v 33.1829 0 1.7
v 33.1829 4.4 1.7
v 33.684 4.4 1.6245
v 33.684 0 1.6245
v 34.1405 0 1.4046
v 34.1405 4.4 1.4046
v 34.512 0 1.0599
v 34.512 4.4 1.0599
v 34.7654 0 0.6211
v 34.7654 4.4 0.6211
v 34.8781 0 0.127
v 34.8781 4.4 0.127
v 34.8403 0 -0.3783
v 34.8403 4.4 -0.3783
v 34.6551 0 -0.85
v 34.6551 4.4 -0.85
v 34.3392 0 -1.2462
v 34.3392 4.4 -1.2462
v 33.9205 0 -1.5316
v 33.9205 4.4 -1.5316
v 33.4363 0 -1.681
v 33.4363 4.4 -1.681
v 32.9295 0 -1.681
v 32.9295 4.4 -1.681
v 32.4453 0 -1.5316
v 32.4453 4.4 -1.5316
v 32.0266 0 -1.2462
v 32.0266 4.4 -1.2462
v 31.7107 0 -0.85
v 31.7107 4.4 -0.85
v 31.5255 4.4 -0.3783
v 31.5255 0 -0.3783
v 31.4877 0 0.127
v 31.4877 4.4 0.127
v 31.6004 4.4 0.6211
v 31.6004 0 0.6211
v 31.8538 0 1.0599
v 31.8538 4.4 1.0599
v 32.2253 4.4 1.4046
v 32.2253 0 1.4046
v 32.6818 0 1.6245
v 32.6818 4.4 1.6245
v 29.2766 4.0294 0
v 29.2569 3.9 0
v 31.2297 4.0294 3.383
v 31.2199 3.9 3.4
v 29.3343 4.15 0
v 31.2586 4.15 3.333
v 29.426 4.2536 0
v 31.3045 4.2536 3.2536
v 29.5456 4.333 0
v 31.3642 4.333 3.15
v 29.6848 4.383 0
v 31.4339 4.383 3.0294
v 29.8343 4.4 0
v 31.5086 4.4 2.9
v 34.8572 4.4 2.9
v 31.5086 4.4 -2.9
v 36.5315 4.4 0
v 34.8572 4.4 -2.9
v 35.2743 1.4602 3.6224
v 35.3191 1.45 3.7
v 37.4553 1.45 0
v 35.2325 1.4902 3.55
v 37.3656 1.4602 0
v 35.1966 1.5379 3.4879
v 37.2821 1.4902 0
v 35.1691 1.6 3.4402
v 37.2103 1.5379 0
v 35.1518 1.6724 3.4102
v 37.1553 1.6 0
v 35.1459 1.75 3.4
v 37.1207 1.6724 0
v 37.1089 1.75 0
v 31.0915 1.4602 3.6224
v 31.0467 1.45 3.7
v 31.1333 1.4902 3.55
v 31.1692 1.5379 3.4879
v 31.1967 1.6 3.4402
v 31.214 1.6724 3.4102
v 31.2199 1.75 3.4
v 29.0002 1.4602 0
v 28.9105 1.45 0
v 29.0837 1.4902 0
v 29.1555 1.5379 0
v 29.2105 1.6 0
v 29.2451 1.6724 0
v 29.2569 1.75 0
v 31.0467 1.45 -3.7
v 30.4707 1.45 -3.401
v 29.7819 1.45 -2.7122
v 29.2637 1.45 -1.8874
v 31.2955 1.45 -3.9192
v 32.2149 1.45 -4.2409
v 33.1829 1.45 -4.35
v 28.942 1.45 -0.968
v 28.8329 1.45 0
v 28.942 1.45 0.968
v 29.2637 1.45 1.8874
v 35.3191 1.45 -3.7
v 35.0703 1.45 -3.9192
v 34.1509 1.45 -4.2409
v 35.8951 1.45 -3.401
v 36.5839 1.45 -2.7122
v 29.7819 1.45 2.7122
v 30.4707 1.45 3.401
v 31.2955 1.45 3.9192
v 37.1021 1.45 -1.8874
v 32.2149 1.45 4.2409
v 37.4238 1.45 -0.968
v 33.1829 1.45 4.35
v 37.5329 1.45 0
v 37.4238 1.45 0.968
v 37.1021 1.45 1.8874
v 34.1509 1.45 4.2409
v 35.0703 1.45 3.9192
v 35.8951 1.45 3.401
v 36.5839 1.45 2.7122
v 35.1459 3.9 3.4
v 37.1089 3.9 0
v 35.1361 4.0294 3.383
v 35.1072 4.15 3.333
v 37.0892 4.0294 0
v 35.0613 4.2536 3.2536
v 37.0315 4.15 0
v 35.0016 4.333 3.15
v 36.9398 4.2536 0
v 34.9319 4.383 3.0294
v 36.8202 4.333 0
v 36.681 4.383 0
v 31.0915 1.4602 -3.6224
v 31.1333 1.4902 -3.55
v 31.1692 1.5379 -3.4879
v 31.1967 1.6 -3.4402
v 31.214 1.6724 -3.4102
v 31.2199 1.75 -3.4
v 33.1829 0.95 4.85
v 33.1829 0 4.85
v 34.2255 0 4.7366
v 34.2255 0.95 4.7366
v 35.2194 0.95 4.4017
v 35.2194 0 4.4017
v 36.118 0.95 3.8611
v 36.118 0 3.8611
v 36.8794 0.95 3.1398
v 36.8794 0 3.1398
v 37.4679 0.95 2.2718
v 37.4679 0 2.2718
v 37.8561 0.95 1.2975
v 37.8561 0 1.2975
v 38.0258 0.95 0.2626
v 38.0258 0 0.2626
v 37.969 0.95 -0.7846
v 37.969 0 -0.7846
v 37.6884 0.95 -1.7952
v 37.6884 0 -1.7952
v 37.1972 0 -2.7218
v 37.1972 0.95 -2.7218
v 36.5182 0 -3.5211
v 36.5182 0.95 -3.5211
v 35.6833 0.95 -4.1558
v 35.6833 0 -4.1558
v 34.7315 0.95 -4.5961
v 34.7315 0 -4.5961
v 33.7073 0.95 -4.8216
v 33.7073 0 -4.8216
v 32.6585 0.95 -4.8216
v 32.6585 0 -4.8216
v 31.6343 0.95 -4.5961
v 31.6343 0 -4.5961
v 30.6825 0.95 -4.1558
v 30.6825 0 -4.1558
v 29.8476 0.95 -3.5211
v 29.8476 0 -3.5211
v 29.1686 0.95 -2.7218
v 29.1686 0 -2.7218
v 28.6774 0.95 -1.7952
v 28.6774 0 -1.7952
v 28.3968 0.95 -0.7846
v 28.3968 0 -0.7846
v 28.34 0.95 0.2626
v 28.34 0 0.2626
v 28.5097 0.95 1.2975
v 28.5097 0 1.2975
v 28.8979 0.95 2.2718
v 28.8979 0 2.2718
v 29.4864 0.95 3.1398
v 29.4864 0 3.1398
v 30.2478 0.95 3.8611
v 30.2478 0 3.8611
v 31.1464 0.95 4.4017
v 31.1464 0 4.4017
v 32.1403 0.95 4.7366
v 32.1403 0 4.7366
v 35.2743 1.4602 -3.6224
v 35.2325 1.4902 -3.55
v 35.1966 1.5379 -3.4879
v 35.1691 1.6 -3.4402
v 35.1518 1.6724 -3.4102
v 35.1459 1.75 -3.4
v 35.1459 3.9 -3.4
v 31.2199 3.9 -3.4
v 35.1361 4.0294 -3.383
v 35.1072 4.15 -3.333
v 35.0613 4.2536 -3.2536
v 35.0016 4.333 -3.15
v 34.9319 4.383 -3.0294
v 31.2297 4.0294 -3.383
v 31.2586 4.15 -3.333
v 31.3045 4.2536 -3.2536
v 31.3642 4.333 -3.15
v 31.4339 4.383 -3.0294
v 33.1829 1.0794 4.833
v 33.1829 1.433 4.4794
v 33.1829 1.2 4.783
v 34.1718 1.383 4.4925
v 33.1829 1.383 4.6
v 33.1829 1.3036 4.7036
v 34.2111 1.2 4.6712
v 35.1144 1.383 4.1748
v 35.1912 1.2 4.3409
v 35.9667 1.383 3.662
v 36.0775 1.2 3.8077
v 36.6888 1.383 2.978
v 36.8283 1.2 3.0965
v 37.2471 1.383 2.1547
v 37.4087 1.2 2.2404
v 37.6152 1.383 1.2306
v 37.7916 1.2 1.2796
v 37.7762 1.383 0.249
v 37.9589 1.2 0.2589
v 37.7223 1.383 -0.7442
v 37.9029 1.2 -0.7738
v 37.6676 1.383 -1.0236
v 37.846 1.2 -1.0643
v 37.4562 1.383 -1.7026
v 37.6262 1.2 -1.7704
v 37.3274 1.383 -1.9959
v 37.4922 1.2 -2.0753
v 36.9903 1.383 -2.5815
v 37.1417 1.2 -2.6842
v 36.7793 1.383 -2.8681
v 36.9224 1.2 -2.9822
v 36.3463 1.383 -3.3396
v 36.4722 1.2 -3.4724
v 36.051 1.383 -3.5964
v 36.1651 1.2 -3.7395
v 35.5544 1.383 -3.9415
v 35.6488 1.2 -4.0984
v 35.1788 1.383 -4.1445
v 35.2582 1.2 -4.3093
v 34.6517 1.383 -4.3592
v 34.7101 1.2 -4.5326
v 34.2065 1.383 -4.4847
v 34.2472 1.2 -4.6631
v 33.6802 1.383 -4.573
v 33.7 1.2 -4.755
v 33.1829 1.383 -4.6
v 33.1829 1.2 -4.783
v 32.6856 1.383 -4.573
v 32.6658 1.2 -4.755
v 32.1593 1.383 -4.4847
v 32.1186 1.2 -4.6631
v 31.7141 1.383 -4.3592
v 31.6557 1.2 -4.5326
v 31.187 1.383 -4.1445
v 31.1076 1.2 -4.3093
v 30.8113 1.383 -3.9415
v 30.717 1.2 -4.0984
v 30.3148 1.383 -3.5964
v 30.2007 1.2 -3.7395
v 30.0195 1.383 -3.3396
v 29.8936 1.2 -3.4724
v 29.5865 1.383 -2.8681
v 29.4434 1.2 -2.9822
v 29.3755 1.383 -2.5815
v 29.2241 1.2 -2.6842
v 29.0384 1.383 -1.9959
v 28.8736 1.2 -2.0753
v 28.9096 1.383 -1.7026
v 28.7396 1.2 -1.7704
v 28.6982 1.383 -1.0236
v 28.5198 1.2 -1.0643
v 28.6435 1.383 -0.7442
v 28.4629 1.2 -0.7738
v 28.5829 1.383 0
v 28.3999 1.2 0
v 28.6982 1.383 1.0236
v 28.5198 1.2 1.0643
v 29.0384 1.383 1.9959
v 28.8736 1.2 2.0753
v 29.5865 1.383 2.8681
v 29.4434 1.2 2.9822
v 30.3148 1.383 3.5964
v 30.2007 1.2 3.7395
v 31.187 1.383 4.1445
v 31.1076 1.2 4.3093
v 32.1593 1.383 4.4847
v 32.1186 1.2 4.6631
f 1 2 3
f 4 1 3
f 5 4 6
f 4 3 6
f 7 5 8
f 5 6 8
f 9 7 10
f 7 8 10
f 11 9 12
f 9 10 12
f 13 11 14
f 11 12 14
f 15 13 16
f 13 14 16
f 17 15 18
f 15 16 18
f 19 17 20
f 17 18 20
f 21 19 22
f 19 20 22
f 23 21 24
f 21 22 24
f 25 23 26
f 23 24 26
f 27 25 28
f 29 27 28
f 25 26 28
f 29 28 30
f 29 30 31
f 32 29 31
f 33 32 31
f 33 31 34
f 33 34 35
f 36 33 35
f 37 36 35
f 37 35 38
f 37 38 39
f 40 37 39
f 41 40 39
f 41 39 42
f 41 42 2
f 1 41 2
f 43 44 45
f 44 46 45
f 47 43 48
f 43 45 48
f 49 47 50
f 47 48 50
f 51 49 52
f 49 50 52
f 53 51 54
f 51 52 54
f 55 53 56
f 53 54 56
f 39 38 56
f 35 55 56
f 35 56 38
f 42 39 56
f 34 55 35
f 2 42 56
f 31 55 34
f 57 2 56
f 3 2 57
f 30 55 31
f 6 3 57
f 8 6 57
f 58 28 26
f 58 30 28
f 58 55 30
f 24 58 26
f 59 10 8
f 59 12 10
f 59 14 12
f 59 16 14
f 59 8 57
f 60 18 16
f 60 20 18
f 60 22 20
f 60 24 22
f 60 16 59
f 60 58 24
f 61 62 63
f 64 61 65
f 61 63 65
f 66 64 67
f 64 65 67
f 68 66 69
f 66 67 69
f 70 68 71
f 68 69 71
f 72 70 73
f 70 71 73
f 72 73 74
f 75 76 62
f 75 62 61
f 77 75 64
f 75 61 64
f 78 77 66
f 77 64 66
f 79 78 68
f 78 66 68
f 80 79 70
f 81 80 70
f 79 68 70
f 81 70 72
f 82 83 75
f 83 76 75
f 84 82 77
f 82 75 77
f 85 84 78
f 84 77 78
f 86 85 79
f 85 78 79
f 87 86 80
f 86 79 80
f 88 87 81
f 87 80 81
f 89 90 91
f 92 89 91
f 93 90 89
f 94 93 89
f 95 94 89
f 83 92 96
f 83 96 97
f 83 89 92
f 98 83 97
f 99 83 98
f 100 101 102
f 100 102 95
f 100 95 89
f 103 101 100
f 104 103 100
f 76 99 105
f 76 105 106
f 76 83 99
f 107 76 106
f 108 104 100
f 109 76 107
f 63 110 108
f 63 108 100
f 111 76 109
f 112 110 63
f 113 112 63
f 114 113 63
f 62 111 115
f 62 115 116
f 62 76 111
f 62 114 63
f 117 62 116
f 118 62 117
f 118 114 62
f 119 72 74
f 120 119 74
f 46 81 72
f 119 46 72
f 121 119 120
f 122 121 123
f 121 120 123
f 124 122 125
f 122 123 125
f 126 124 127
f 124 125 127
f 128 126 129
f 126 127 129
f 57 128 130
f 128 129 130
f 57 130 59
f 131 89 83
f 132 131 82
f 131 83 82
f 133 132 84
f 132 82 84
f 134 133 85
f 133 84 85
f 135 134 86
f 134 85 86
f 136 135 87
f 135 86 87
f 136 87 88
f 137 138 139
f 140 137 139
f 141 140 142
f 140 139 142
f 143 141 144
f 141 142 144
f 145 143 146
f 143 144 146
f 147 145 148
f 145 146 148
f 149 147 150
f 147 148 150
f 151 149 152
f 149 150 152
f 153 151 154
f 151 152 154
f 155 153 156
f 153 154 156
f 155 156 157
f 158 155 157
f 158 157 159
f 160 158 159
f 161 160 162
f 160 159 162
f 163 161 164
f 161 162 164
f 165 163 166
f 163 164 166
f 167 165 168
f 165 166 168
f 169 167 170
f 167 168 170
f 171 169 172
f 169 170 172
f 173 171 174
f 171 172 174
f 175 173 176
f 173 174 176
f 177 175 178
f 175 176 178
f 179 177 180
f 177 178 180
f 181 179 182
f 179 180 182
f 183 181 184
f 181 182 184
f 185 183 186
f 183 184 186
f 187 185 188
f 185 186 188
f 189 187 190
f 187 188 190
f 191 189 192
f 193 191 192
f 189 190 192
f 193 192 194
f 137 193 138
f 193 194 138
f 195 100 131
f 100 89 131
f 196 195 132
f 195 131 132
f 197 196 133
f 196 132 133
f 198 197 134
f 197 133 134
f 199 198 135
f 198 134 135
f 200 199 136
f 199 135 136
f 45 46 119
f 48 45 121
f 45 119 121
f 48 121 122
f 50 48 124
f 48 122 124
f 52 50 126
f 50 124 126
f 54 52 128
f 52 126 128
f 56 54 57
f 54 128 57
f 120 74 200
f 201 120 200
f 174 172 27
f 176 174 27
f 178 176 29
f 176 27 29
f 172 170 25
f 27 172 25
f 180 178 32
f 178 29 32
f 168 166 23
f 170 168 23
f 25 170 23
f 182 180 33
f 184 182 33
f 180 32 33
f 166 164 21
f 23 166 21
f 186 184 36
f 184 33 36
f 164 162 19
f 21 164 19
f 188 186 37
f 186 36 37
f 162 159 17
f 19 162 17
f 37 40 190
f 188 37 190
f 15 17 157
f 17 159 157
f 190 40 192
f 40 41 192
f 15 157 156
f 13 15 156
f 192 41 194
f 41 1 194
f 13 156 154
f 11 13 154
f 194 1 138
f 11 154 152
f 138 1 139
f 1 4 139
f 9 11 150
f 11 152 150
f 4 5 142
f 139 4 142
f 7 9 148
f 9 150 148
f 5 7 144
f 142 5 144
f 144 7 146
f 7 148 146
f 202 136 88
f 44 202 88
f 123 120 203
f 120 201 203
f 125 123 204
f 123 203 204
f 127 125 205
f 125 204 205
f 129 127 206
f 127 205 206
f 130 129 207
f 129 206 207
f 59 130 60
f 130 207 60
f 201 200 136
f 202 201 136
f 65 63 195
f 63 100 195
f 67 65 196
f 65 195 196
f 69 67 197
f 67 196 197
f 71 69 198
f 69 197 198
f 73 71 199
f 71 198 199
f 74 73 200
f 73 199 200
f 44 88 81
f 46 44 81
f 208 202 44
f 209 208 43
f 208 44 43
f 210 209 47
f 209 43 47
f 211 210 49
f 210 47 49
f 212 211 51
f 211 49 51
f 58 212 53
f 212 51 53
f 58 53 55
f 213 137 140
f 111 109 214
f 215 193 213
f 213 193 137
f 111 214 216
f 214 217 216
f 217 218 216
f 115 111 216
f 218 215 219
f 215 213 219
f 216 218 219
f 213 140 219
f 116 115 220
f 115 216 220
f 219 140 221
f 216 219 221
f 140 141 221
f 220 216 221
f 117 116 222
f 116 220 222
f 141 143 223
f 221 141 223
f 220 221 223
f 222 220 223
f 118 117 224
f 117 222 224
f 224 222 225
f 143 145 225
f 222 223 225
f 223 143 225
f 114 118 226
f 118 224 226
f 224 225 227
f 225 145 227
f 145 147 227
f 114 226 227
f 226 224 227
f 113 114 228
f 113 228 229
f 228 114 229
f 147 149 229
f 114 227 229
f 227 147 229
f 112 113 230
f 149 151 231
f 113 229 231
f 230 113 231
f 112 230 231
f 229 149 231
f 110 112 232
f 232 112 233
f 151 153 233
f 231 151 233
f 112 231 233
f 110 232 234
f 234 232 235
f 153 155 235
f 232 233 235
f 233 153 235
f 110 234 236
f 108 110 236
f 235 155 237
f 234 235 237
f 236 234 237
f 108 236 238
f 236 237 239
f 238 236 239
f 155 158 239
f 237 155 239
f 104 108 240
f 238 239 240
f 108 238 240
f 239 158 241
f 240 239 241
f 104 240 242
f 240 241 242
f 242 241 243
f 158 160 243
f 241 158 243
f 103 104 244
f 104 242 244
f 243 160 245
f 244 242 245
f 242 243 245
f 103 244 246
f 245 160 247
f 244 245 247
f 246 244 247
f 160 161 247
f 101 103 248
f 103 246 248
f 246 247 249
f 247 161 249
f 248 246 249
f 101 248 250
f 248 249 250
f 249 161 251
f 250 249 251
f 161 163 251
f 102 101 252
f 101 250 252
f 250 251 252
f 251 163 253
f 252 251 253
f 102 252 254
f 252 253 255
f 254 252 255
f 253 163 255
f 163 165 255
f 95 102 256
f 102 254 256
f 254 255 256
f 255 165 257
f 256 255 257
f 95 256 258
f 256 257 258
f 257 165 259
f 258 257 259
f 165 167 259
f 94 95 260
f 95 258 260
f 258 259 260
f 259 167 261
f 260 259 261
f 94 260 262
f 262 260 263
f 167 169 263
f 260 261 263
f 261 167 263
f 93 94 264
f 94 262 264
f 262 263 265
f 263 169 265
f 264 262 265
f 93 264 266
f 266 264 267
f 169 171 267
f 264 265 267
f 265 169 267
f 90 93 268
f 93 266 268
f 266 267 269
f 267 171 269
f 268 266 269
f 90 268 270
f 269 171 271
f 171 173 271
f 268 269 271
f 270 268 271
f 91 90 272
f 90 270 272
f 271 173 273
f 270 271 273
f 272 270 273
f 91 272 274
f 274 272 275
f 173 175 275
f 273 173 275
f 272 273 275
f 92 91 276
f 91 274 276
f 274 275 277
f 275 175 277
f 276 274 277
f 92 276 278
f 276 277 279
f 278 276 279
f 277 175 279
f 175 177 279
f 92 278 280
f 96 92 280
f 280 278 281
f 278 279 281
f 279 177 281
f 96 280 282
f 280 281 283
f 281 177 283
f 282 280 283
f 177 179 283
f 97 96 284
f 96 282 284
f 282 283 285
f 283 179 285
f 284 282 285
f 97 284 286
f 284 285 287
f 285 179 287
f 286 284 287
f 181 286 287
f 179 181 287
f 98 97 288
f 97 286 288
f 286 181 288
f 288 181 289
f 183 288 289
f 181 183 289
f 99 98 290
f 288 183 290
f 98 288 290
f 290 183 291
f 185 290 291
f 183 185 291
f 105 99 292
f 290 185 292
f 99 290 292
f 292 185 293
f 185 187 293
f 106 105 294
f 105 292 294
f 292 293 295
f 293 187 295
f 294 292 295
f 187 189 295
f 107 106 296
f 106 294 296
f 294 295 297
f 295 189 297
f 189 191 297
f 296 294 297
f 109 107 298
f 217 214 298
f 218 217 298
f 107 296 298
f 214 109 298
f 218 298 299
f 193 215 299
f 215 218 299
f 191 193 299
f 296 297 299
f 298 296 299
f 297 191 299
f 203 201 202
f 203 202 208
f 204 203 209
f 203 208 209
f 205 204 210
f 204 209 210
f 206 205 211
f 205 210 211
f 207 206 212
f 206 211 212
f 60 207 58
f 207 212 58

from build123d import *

# Parameters (mm, degrees)
SKETCH_1_R          = 4.85
EXTRUDE_1_DEPTH     = 1.45
EXTRUDE_2_DEPTH     = 2.95
SKETCH_3_R          = 1.7
CUT_EXTRUDE_1_DEPTH = 39.592535488
FILLET_1_R          = 0.5
FILLET_2_R          = 0.5
FILLET_3_R          = 0.3


with BuildPart() as part:
    # 草图1 → 凸台-拉伸1 (new body)
    with BuildSketch(Plane(origin=(0, 0, 0), x_dir=(1, 0, 0), z_dir=(0, 1, 0))):
        with Locations(Location((33.182897542, 0, 0), (0, 0, 270))):
            Circle(SKETCH_1_R)
    extrude(amount=EXTRUDE_1_DEPTH)

    # 草图2 → 凸台-拉伸2 (add)
    with BuildSketch(Plane(origin=(0, 1.45, 0), x_dir=(1, 0, 0), z_dir=(0, 1, 0))):
        Polygon((37.108879372, 0), (35.145888457, 3.4), (31.219906626, 3.4), (29.256915711, 0), (31.219906626, -3.4), (35.145888457, -3.4), align=None)
    extrude(amount=EXTRUDE_2_DEPTH)

    # 草图3 → 切除-拉伸1 (cut, through all)
    with BuildSketch(Plane(origin=(0, 4.4, 0), x_dir=(1, 0, 0), z_dir=(0, 1, 0))):
        with Locations(Location((33.182897542, 0, 0), (0, 0, 270))):
            Circle(SKETCH_3_R)
    extrude(amount=-CUT_EXTRUDE_1_DEPTH, mode=Mode.SUBTRACT)

    # 圆角1
    fillet_1_edges = [part.edges().sort_by_distance(p)[0] for p in [
        (36.127383914, 4.4, 1.7),
        (36.127383914, 4.4, -1.7),
        (33.182897542, 4.4, -3.4),
        (30.238411169, 4.4, -1.7),
        (30.238411169, 4.4, 1.7),
        (33.182897542, 4.4, 3.4),
    ]]
    fillet(fillet_1_edges, radius=FILLET_1_R)

    # 圆角2
    fillet_2_edges = [part.edges().sort_by_distance(p)[0] for p in [
        (33.182897542, 1.45, -4.85),
    ]]
    fillet(fillet_2_edges, radius=FILLET_2_R)

    # 圆角3
    fillet_3_edges = [part.edges().sort_by_distance(p)[0] for p in [
        (36.127383914, 1.45, 1.7),
        (36.127383914, 1.45, -1.7),
        (33.182897542, 1.45, -3.4),
        (30.238411169, 1.45, -1.7),
        (30.238411169, 1.45, 1.7),
        (33.182897542, 1.45, 3.4),
    ]]
    fillet(fillet_3_edges, radius=FILLET_3_R)


solid = part.part
